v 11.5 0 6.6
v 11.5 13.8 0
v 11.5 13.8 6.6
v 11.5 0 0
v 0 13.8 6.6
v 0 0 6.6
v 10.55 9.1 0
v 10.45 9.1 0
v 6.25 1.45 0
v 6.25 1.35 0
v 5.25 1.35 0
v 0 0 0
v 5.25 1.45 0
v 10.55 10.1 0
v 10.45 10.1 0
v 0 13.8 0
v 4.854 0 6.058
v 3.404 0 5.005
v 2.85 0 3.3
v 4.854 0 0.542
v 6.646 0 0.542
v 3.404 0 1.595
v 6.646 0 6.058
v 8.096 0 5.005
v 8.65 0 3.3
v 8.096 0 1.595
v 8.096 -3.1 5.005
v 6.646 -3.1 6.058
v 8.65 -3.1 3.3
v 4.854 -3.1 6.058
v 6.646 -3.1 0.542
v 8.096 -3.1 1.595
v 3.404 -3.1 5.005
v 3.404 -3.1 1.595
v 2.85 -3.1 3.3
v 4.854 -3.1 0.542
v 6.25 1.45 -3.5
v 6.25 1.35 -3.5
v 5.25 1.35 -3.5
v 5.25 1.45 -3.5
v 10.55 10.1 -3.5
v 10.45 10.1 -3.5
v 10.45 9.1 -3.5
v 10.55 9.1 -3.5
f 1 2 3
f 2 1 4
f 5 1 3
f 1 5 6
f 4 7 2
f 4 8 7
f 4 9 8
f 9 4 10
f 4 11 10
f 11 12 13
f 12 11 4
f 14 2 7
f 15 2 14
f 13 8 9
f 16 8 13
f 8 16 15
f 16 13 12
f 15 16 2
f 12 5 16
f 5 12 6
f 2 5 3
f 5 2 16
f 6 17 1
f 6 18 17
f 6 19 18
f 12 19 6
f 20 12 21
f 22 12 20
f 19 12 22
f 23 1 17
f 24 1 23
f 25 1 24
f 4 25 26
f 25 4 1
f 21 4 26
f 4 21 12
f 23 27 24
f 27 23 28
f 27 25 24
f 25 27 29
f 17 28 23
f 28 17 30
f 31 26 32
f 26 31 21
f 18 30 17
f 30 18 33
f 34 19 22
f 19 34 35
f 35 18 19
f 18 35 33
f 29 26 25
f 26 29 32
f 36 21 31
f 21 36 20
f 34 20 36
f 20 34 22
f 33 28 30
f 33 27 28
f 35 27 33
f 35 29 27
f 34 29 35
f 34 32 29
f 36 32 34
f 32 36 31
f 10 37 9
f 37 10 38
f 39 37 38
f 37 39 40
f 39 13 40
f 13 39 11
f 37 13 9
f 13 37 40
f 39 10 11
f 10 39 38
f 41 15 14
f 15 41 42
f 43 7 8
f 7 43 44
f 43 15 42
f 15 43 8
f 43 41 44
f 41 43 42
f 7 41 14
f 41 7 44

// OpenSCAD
xt=11.5;
yt=13.8;
zt=6.6;
dj=5.8;
hj=3.1;
px=1;
py=0.1;
pz=3.5;

//gehäuse
cube([xt,yt,zt]);
//anschluss
translate([xt/2,0,zt/2])
rotate([90,0,0])
cylinder(r=dj/2,h=hj);
//pins
//pin 1
translate([5.75,1.4,-pz/2])
rotate([0,0,0])
cube([px,py,pz],center=true);
//pin 2
translate([10.5,9.6,-pz/2])
rotate([0,0,90])
cube([px,py,pz],center=true);
//pin 2
translate([10.5,9.6,-pz/2])
rotate([0,0,90])
cube([px,py,pz],center=true);
